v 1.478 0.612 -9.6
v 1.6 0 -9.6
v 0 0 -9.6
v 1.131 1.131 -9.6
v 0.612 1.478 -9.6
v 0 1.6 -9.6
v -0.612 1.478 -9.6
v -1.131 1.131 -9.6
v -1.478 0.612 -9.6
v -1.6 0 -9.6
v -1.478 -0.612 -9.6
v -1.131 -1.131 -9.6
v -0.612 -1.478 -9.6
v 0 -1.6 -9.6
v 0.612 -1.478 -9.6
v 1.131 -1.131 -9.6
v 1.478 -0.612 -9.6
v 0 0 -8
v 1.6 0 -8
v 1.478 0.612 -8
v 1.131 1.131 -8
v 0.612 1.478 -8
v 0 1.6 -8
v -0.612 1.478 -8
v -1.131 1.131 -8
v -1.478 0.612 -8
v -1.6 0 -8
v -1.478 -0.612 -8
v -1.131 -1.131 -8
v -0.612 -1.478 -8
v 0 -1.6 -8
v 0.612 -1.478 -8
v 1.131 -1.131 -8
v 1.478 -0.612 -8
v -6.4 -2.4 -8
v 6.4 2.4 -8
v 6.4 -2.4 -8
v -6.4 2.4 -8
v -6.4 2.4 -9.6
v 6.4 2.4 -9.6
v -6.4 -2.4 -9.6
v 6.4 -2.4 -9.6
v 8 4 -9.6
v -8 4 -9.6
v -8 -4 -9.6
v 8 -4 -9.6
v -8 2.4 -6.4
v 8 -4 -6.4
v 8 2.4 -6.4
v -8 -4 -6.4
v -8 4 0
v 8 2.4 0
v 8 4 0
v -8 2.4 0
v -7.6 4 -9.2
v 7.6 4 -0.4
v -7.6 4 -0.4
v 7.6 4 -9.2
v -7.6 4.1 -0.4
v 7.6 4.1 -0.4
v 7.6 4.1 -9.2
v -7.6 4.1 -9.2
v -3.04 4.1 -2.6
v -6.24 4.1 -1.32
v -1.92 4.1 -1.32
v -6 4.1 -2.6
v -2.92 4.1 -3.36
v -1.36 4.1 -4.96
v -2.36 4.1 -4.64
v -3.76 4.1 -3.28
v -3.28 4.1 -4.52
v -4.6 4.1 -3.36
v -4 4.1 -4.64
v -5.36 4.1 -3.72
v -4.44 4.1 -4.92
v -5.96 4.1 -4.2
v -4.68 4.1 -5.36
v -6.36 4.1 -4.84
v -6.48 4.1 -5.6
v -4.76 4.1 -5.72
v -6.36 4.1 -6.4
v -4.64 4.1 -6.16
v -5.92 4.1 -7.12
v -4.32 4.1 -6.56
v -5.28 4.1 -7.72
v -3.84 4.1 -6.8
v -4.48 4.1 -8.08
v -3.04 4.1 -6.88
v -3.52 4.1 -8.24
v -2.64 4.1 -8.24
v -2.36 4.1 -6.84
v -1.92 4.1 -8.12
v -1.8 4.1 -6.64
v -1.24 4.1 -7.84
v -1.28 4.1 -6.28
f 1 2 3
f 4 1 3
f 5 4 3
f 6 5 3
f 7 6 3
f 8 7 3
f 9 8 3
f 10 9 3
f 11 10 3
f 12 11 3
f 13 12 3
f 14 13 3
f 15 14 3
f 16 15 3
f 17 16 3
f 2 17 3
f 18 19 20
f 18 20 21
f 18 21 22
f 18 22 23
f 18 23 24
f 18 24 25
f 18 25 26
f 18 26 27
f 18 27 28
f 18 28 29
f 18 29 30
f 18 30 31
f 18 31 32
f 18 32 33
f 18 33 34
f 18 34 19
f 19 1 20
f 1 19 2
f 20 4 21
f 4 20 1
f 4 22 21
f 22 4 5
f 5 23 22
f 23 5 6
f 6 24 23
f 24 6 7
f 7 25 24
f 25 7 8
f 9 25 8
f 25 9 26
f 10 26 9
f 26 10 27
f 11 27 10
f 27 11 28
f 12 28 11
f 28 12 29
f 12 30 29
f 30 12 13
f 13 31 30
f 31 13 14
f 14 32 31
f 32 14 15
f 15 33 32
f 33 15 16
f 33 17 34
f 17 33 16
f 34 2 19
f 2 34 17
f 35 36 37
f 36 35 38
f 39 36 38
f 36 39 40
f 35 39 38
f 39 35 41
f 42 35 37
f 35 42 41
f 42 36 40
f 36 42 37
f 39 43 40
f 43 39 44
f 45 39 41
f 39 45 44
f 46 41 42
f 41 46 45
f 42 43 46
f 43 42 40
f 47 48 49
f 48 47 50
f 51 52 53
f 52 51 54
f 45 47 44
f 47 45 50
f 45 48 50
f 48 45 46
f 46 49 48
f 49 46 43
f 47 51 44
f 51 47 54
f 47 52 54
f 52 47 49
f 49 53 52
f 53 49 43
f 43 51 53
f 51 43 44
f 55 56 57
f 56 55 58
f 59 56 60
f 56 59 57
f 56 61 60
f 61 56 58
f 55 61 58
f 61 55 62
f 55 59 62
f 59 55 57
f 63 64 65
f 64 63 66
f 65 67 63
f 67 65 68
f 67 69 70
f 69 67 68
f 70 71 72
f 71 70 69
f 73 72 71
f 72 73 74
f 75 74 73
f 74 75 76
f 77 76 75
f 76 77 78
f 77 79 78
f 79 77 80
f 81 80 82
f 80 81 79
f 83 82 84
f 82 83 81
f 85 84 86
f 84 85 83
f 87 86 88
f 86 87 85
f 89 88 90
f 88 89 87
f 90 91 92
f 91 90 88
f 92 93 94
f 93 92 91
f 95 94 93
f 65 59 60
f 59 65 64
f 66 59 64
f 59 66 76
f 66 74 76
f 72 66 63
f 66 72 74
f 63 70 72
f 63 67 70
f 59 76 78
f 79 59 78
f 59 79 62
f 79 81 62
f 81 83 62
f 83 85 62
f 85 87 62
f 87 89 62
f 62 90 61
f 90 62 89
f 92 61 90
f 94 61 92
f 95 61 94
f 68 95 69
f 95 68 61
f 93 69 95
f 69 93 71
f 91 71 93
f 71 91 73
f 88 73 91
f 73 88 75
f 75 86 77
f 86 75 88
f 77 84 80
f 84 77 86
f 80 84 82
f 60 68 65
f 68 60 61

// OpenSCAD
// file: ../p/4-4edge.scad
use <../lib.scad>
function ldraw_lib__4_4edge() = [
// 0 Circle 1.0
// 0 Name: 4-4edge.dat
// 0 Author: James Jessiman
// 0 !LDRAW_ORG Primitive UPDATE 2017-01
// 0 !LICENSE Licensed under CC BY 2.0 and CC BY 4.0 : see CAreadme.txt
// 
// 0 BFC CERTIFY CCW
  [0,"BFC","CERTIFY"],
  [0,"BFC","CCW"],
// 
// 0 !HISTORY 1998-12-15 [PTadmin] Official Update 1998-10
// 0 !HISTORY 2005-12-28 [PTadmin] Official Update 2005-01
// 0 !HISTORY 2007-06-24 [PTadmin] Header formatted for Contributor Agreement
// 0 !HISTORY 2008-07-01 [PTadmin] Official Update 2008-01
// 0 !HISTORY 2017-01-15 [Steffen] BFCed
// 0 !HISTORY 2017-12-30 [PTadmin] Official Update 2017-01
// 
// 
// 2 24 1 0 0 0.9239 0 0.3827
  [2,24,1,0,0,0.9239,0,0.3827],
// 2 24 0.9239 0 0.3827 0.7071 0 0.7071
  [2,24,0.9239,0,0.3827,0.7071,0,0.7071],
// 2 24 0.7071 0 0.7071 0.3827 0 0.9239
  [2,24,0.7071,0,0.7071,0.3827,0,0.9239],
// 2 24 0.3827 0 0.9239 0 0 1
  [2,24,0.3827,0,0.9239,0,0,1],
// 2 24 0 0 1 -0.3827 0 0.9239
  [2,24,0,0,1,-0.3827,0,0.9239],
// 2 24 -0.3827 0 0.9239 -0.7071 0 0.7071
  [2,24,-0.3827,0,0.9239,-0.7071,0,0.7071],
// 2 24 -0.7071 0 0.7071 -0.9239 0 0.3827
  [2,24,-0.7071,0,0.7071,-0.9239,0,0.3827],
// 2 24 -0.9239 0 0.3827 -1 0 -0
  [2,24,-0.9239,0,0.3827,-1,0,-0],
// 2 24 -1 0 -0 -0.9239 0 -0.3827
  [2,24,-1,0,-0,-0.9239,0,-0.3827],
// 2 24 -0.9239 0 -0.3827 -0.7071 0 -0.7071
  [2,24,-0.9239,0,-0.3827,-0.7071,0,-0.7071],
// 2 24 -0.7071 0 -0.7071 -0.3827 0 -0.9239
  [2,24,-0.7071,0,-0.7071,-0.3827,0,-0.9239],
// 2 24 -0.3827 0 -0.9239 0 0 -1
  [2,24,-0.3827,0,-0.9239,0,0,-1],
// 2 24 0 0 -1 0.3827 0 -0.9239
  [2,24,0,0,-1,0.3827,0,-0.9239],
// 2 24 0.3827 0 -0.9239 0.7071 0 -0.7071
  [2,24,0.3827,0,-0.9239,0.7071,0,-0.7071],
// 2 24 0.7071 0 -0.7071 0.9239 0 -0.3827
  [2,24,0.7071,0,-0.7071,0.9239,0,-0.3827],
// 2 24 0.9239 0 -0.3827 1 0 0
  [2,24,0.9239,0,-0.3827,1,0,0],
];
module ldraw_lib__4_4edge(step=0, col=false, unit=2/5, alt=false, line=0.2, solid=!$preview)
    makepoly(ldraw_lib__4_4edge(), step=step, col=col, unit=unit, alt=alt, line=line, solid=solid);
ldraw_lib__4_4edge(line=0.2);
// file: ../p/4-4disc.scad
use <../lib.scad>
function ldraw_lib__4_4disc() = [
// 0 Disc 1.0
// 0 Name: 4-4disc.dat
// 0 Author: James Jessiman
// 0 !LDRAW_ORG Primitive UPDATE 2002-02
// 0 !LICENSE Licensed under CC BY 2.0 and CC BY 4.0 : see CAreadme.txt
// 
// 0 BFC CERTIFY CCW
  [0,"BFC","CERTIFY"],
  [0,"BFC","CCW"],
// 
// 0 !HISTORY 1998-12-15 [PTadmin] Official Update 1998-10
// 0 !HISTORY 2002-03-23 [sbliss] Added BFC statement
// 0 !HISTORY 2002-04-25 [PTadmin] Official Update 2002-02
// 0 !HISTORY 2007-06-24 [PTadmin] Header formatted for Contributor Agreement
// 0 !HISTORY 2008-07-01 [PTadmin] Official Update 2008-01
// 
// 
// 3 16 0 0 0 1 0 0 0.9239 0 0.3827
  [3,16,0,0,0,1,0,0,0.9239,0,0.3827],
// 3 16 0 0 0 0.9239 0 0.3827 0.7071 0 0.7071
  [3,16,0,0,0,0.9239,0,0.3827,0.7071,0,0.7071],
// 3 16 0 0 0 0.7071 0 0.7071 0.3827 0 0.9239
  [3,16,0,0,0,0.7071,0,0.7071,0.3827,0,0.9239],
// 3 16 0 0 0 0.3827 0 0.9239 0 0 1
  [3,16,0,0,0,0.3827,0,0.9239,0,0,1],
// 3 16 0 0 0 0 0 1 -0.3827 0 0.9239
  [3,16,0,0,0,0,0,1,-0.3827,0,0.9239],
// 3 16 0 0 0 -0.3827 0 0.9239 -0.7071 0 0.7071
  [3,16,0,0,0,-0.3827,0,0.9239,-0.7071,0,0.7071],
// 3 16 0 0 0 -0.7071 0 0.7071 -0.9239 0 0.3827
  [3,16,0,0,0,-0.7071,0,0.7071,-0.9239,0,0.3827],
// 3 16 0 0 0 -0.9239 0 0.3827 -1 0 -0
  [3,16,0,0,0,-0.9239,0,0.3827,-1,0,-0],
// 3 16 0 0 0 -1 0 -0 -0.9239 0 -0.3827
  [3,16,0,0,0,-1,0,-0,-0.9239,0,-0.3827],
// 3 16 0 0 0 -0.9239 0 -0.3827 -0.7071 0 -0.7071
  [3,16,0,0,0,-0.9239,0,-0.3827,-0.7071,0,-0.7071],
// 3 16 0 0 0 -0.7071 0 -0.7071 -0.3827 0 -0.9239
  [3,16,0,0,0,-0.7071,0,-0.7071,-0.3827,0,-0.9239],
// 3 16 0 0 0 -0.3827 0 -0.9239 0 0 -1
  [3,16,0,0,0,-0.3827,0,-0.9239,0,0,-1],
// 3 16 0 0 0 0 0 -1 0.3827 0 -0.9239
  [3,16,0,0,0,0,0,-1,0.3827,0,-0.9239],
// 3 16 0 0 0 0.3827 0 -0.9239 0.7071 0 -0.7071
  [3,16,0,0,0,0.3827,0,-0.9239,0.7071,0,-0.7071],
// 3 16 0 0 0 0.7071 0 -0.7071 0.9239 0 -0.3827
  [3,16,0,0,0,0.7071,0,-0.7071,0.9239,0,-0.3827],
// 3 16 0 0 0 0.9239 0 -0.3827 1 0 0
  [3,16,0,0,0,0.9239,0,-0.3827,1,0,0],
// 0
];
module ldraw_lib__4_4disc(step=0, col=false, unit=2/5, alt=false, line=0.2, solid=!$preview)
    makepoly(ldraw_lib__4_4disc(), step=step, col=col, unit=unit, alt=alt, line=line, solid=solid);
ldraw_lib__4_4disc(line=0.2);
// file: ../p/4-4cyli.scad
use <../lib.scad>
$fa=1; $fs=0.2;
function ldraw_lib__4_4cyli(realsolid=false) = [
// 0 Cylinder 1.0
// 0 Name: 4-4cyli.dat
// 0 Author: James Jessiman
// 0 !LDRAW_ORG Primitive UPDATE 2005-01
// 0 !LICENSE Licensed under CC BY 2.0 and CC BY 4.0 : see CAreadme.txt
// 
// 0 BFC CERTIFY CCW
  [0,"BFC","CERTIFY"],
  [0,"BFC","CCW"],
// 
// 0 !HISTORY 1998-12-15 [PTadmin] Official Update 1998-10
// 0 !HISTORY 2002-03-23 [sbliss] Added BFC statement; merged headers from files in distributions LDraw 0.27 and Complete.
// 0 !HISTORY 2002-04-25 [PTadmin] Official Update 2002-02
// 0 !HISTORY 2004-12-14 [guyvivan] BFC CCW
// 0 !HISTORY 2005-12-28 [PTadmin] Official Update 2005-01
// 0 !HISTORY 2007-06-24 [PTadmin] Header formatted for Contributor Agreement
// 0 !HISTORY 2008-07-01 [PTadmin] Official Update 2008-01
// 
// 
// 4 16 1 1 0 0.9239 1 0.3827 0.9239 0 0.3827 1 0 0
  [4,16,1,1,0,0.9239,1,0.3827,0.9239,0,0.3827,1,0,0],
// 5 24 1 0 0 1 1 0 0.9239 0 0.3827 0.9239 0 -0.3827
  [5,24,1,0,0,1,1,0,0.9239,0,0.3827,0.9239,0,-0.3827],
// 4 16 0.9239 1 0.3827 0.7071 1 0.7071 0.7071 0 0.7071 0.9239 0 0.3827
  [4,16,0.9239,1,0.3827,0.7071,1,0.7071,0.7071,0,0.7071,0.9239,0,0.3827],
// 5 24 0.9239 0 0.3827 0.9239 1 0.3827 0.7071 0 0.7071 1 0 0
  [5,24,0.9239,0,0.3827,0.9239,1,0.3827,0.7071,0,0.7071,1,0,0],
// 4 16 0.7071 1 0.7071 0.3827 1 0.9239 0.3827 0 0.9239 0.7071 0 0.7071
  [4,16,0.7071,1,0.7071,0.3827,1,0.9239,0.3827,0,0.9239,0.7071,0,0.7071],
// 5 24 0.7071 0 0.7071 0.7071 1 0.7071 0.3827 0 0.9239 0.9239 0 0.3827
  [5,24,0.7071,0,0.7071,0.7071,1,0.7071,0.3827,0,0.9239,0.9239,0,0.3827],
// 4 16 0.3827 1 0.9239 0 1 1 0 0 1 0.3827 0 0.9239
  [4,16,0.3827,1,0.9239,0,1,1,0,0,1,0.3827,0,0.9239],
// 5 24 0.3827 0 0.9239 0.3827 1 0.9239 0 0 1 0.7071 0 0.7071
  [5,24,0.3827,0,0.9239,0.3827,1,0.9239,0,0,1,0.7071,0,0.7071],
// 4 16 0 1 1 -0.3827 1 0.9239 -0.3827 0 0.9239 0 0 1
  [4,16,0,1,1,-0.3827,1,0.9239,-0.3827,0,0.9239,0,0,1],
// 5 24 0 0 1 0 1 1 -0.3827 0 0.9239 0.3827 0 0.9239
  [5,24,0,0,1,0,1,1,-0.3827,0,0.9239,0.3827,0,0.9239],
// 4 16 -0.3827 1 0.9239 -0.7071 1 0.7071 -0.7071 0 0.7071 -0.3827 0 0.9239
  [4,16,-0.3827,1,0.9239,-0.7071,1,0.7071,-0.7071,0,0.7071,-0.3827,0,0.9239],
// 5 24 -0.3827 0 0.9239 -0.3827 1 0.9239 -0.7071 0 0.7071 0 0 1
  [5,24,-0.3827,0,0.9239,-0.3827,1,0.9239,-0.7071,0,0.7071,0,0,1],
// 4 16 -0.7071 1 0.7071 -0.9239 1 0.3827 -0.9239 0 0.3827 -0.7071 0 0.7071
  [4,16,-0.7071,1,0.7071,-0.9239,1,0.3827,-0.9239,0,0.3827,-0.7071,0,0.7071],
// 5 24 -0.7071 0 0.7071 -0.7071 1 0.7071 -0.9239 0 0.3827 -0.3827 0 0.9239
  [5,24,-0.7071,0,0.7071,-0.7071,1,0.7071,-0.9239,0,0.3827,-0.3827,0,0.9239],
// 4 16 -0.9239 1 0.3827 -1 1 0 -1 0 0 -0.9239 0 0.3827
  [4,16,-0.9239,1,0.3827,-1,1,0,-1,0,0,-0.9239,0,0.3827],
// 5 24 -0.9239 0 0.3827 -0.9239 1 0.3827 -1 0 0 -0.7071 0 0.7071
  [5,24,-0.9239,0,0.3827,-0.9239,1,0.3827,-1,0,0,-0.7071,0,0.7071],
// 4 16 -1 1 0 -0.9239 1 -0.3827 -0.9239 0 -0.3827 -1 0 0
  [4,16,-1,1,0,-0.9239,1,-0.3827,-0.9239,0,-0.3827,-1,0,0],
// 5 24 -1 0 0 -1 1 0 -0.9239 0 -0.3827 -0.9239 0 0.3827
  [5,24,-1,0,0,-1,1,0,-0.9239,0,-0.3827,-0.9239,0,0.3827],
// 4 16 -0.9239 1 -0.3827 -0.7071 1 -0.7071 -0.7071 0 -0.7071 -0.9239 0 -0.3827
  [4,16,-0.9239,1,-0.3827,-0.7071,1,-0.7071,-0.7071,0,-0.7071,-0.9239,0,-0.3827],
// 5 24 -0.9239 0 -0.3827 -0.9239 1 -0.3827 -0.7071 0 -0.7071 -1 0 0
  [5,24,-0.9239,0,-0.3827,-0.9239,1,-0.3827,-0.7071,0,-0.7071,-1,0,0],
// 4 16 -0.7071 1 -0.7071 -0.3827 1 -0.9239 -0.3827 0 -0.9239 -0.7071 0 -0.7071
  [4,16,-0.7071,1,-0.7071,-0.3827,1,-0.9239,-0.3827,0,-0.9239,-0.7071,0,-0.7071],
// 5 24 -0.7071 0 -0.7071 -0.7071 1 -0.7071 -0.3827 0 -0.9239 -0.9239 0 -0.3827
  [5,24,-0.7071,0,-0.7071,-0.7071,1,-0.7071,-0.3827,0,-0.9239,-0.9239,0,-0.3827],
// 4 16 -0.3827 1 -0.9239 0 1 -1 0 0 -1 -0.3827 0 -0.9239
  [4,16,-0.3827,1,-0.9239,0,1,-1,0,0,-1,-0.3827,0,-0.9239],
// 5 24 -0.3827 0 -0.9239 -0.3827 1 -0.9239 0 0 -1 -0.7071 0 -0.7071
  [5,24,-0.3827,0,-0.9239,-0.3827,1,-0.9239,0,0,-1,-0.7071,0,-0.7071],
// 4 16 0 1 -1 0.3827 1 -0.9239 0.3827 0 -0.9239 0 0 -1
  [4,16,0,1,-1,0.3827,1,-0.9239,0.3827,0,-0.9239,0,0,-1],
// 5 24 0 0 -1 0 1 -1 0.3827 0 -0.9239 -0.3827 0 -0.9239
  [5,24,0,0,-1,0,1,-1,0.3827,0,-0.9239,-0.3827,0,-0.9239],
// 4 16 0.3827 1 -0.9239 0.7071 1 -0.7071 0.7071 0 -0.7071 0.3827 0 -0.9239
  [4,16,0.3827,1,-0.9239,0.7071,1,-0.7071,0.7071,0,-0.7071,0.3827,0,-0.9239],
// 5 24 0.3827 0 -0.9239 0.3827 1 -0.9239 0.7071 0 -0.7071 0 0 -1
  [5,24,0.3827,0,-0.9239,0.3827,1,-0.9239,0.7071,0,-0.7071,0,0,-1],
// 4 16 0.7071 1 -0.7071 0.9239 1 -0.3827 0.9239 0 -0.3827 0.7071 0 -0.7071
  [4,16,0.7071,1,-0.7071,0.9239,1,-0.3827,0.9239,0,-0.3827,0.7071,0,-0.7071],
// 5 24 0.7071 0 -0.7071 0.7071 1 -0.7071 0.9239 0 -0.3827 0.3827 0 -0.9239
  [5,24,0.7071,0,-0.7071,0.7071,1,-0.7071,0.9239,0,-0.3827,0.3827,0,-0.9239],
// 4 16 0.9239 1 -0.3827 1 1 0 1 0 0 0.9239 0 -0.3827
  [4,16,0.9239,1,-0.3827,1,1,0,1,0,0,0.9239,0,-0.3827],
// 5 24 0.9239 0 -0.3827 0.9239 1 -0.3827 1 0 0 0.7071 0 -0.7071
  [5,24,0.9239,0,-0.3827,0.9239,1,-0.3827,1,0,0,0.7071,0,-0.7071],
// 0
];
module ldraw_lib__4_4cyli(step=0, col=false, unit=2/5, alt=false, line=0.2, solid=!$preview)
    makepoly(ldraw_lib__4_4cyli(solid), step=step, col=col, unit=unit, alt=alt, line=line, solid=solid);
ldraw_lib__4_4cyli(line=0.2);
// file: ../p/stud3.scad
use <../lib.scad>
use <4-4cyli.scad>
use <4-4disc.scad>
use <4-4edge.scad>
function ldraw_lib__stud3() = [
// 0 Stud Tube Solid
// 0 Name: stud3.dat
// 0 Author: James Jessiman
// 0 !LDRAW_ORG Primitive UPDATE 2012-01
// 0 !LICENSE Licensed under CC BY 4.0 : see CAreadme.txt
// 
// 0 BFC CERTIFY CCW
  [0,"BFC","CERTIFY"],
  [0,"BFC","CCW"],
// 
// 0 !HISTORY 2002-04-04 [sbliss] Modified for BFC compliance
// 0 !HISTORY 2002-04-25 [PTadmin] Official Update 2002-02
// 0 !HISTORY 2007-06-24 [PTadmin] Header formatted for Contributor Agreement
// 0 !HISTORY 2008-07-01 [PTadmin] Official Update 2008-01
// 0 !HISTORY 2012-02-16 [Philo] Changed to CCW
// 0 !HISTORY 2012-03-30 [PTadmin] Official Update 2012-01
// 
// 
// 1 16 0 -4 0 4 0 0 0 1 0 0 0 4 4-4edge.dat
  [1,16,0,-4,0,4,0,0,0,1,0,0,0,4, ldraw_lib__4_4edge()],
// 1 16 0 0 0 4 0 0 0 1 0 0 0 4 4-4edge.dat
  [1,16,0,0,0,4,0,0,0,1,0,0,0,4, ldraw_lib__4_4edge()],
// 1 16 0 -4 0 4 0 0 0 1 0 0 0 4 4-4disc.dat
  [1,16,0,-4,0,4,0,0,0,1,0,0,0,4, ldraw_lib__4_4disc()],
  [-1,16,0,0,0,4,0,0,0,-1,0,0,0,4, ldraw_lib__4_4disc()],
// 1 16 0 -4 0 4 0 0 0 4 0 0 0 4 4-4cyli.dat
  [1,16,0,-4,0,4,0,0,0,4,0,0,0,4, ldraw_lib__4_4cyli()],
];
module ldraw_lib__stud3(step=0, col=false, unit=2/5, alt=false, line=0.2, solid=!$preview)
    makepoly(ldraw_lib__stud3(), step=step, col=col, unit=unit, alt=alt, line=line, solid=solid);
ldraw_lib__stud3(line=0.2);
// file: ../p/box5.scad
use <../lib.scad>
function ldraw_lib__box5() = [
// 0 Box with 5 Faces and All Edges
// 0 Name: box5.dat
// 0 Author: James Jessiman
// 0 !LDRAW_ORG Primitive UPDATE 2012-01
// 0 !LICENSE Licensed under CC BY 2.0 and CC BY 4.0 : see CAreadme.txt
// 
// 0 BFC CERTIFY CCW
  [0,"BFC","CERTIFY"],
  [0,"BFC","CCW"],
// 
// 0 !HISTORY 2002-04-03 [sbliss] Modified for BFC compliance
// 0 !HISTORY 2002-04-25 [PTadmin] Official Update 2002-02
// 0 !HISTORY 2007-06-24 [PTadmin] Header formatted for Contributor Agreement
// 0 !HISTORY 2008-07-01 [PTadmin] Official Update 2008-01
// 0 !HISTORY 2012-02-16 [Philo] Changed to CCW
// 0 !HISTORY 2012-03-30 [PTadmin] Official Update 2012-01
// 
// 
// 2 24 1 1 1 -1 1 1
  [2,24,1,1,1,-1,1,1],
// 2 24 -1 1 1 -1 1 -1
  [2,24,-1,1,1,-1,1,-1],
// 2 24 -1 1 -1 1 1 -1
  [2,24,-1,1,-1,1,1,-1],
// 2 24 1 1 -1 1 1 1
  [2,24,1,1,-1,1,1,1],
// 2 24 1 0 1 -1 0 1
  [2,24,1,0,1,-1,0,1],
// 2 24 -1 0 1 -1 0 -1
  [2,24,-1,0,1,-1,0,-1],
// 2 24 -1 0 -1 1 0 -1
  [2,24,-1,0,-1,1,0,-1],
// 2 24 1 0 -1 1 0 1
  [2,24,1,0,-1,1,0,1],
// 2 24 1 0 1 1 1 1
  [2,24,1,0,1,1,1,1],
// 2 24 -1 0 1 -1 1 1
  [2,24,-1,0,1,-1,1,1],
// 2 24 1 0 -1 1 1 -1
  [2,24,1,0,-1,1,1,-1],
// 2 24 -1 0 -1 -1 1 -1
  [2,24,-1,0,-1,-1,1,-1],
// 4 16 -1 1 1 1 1 1 1 1 -1 -1 1 -1
  [4,16,-1,1,1,1,1,1,1,1,-1,-1,1,-1],
// 4 16 -1 1 1 -1 0 1 1 0 1 1 1 1
  [4,16,-1,1,1,-1,0,1,1,0,1,1,1,1],
// 4 16 -1 1 -1 -1 0 -1 -1 0 1 -1 1 1
  [4,16,-1,1,-1,-1,0,-1,-1,0,1,-1,1,1],
// 4 16 1 1 -1 1 0 -1 -1 0 -1 -1 1 -1
  [4,16,1,1,-1,1,0,-1,-1,0,-1,-1,1,-1],
// 4 16 1 1 1 1 0 1 1 0 -1 1 1 -1
  [4,16,1,1,1,1,0,1,1,0,-1,1,1,-1],
];
makepoly(ldraw_lib__box5(), line=0.2);
// file: s/4865as01.scad
use <../../lib.scad>
use <../../p/box5.scad>
use <../../p/stud3.scad>
function ldraw_lib__s__4865as01() = [
// 0 ~Panel  1 x  2 x  1 without Front Face
// 0 Name: s\4865as01.dat
// 0 Author: James Jessiman
// 0 !LDRAW_ORG Subpart UPDATE 2020-03
// 0 !LICENSE Licensed under CC BY 2.0 and CC BY 4.0 : see CAreadme.txt
// 
// 0 BFC CERTIFY CCW
  [0,"BFC","CERTIFY"],
  [0,"BFC","CCW"],
// 
// 0 !HISTORY 2003-07-03 [Steffen] BFCed, subfiled
// 0 !HISTORY 2004-04-22 [PTadmin] Official Update 2004-02
// 0 !HISTORY 2007-09-10 [PTadmin] Header formatted for Contributor Agreement
// 0 !HISTORY 2008-07-01 [PTadmin] Official Update 2008-01
// 0 !HISTORY 2020-07-14 [PTadmin] Renamed from s/4865s01
// 0 !HISTORY 2020-12-29 [PTadmin] Official Update 2020-03
// 
// 
// 1 16 0 20 0 1 0 0 0 -1 0 0 0 1 stud3.dat
  [1,16,0,20,0,1,0,0,0,-1,0,0,0,1, ldraw_lib__stud3()],
// 0 BFC INVERTNEXT
  [0,"BFC","INVERTNEXT"],
// 1 16 0 24 0 16 0 0 0 -4 0 0 0 6 box5.dat
  [1,16,0,24,0,16,0,0,0,-4,0,0,0,6, ldraw_lib__box5()],
// 4 16 20 24 10 16 24 6 -16 24 6 -20 24 10
  [4,16,20,24,10,16,24,6,-16,24,6,-20,24,10],
// 4 16 -20 24 10 -16 24 6 -16 24 -6 -20 24 -10
  [4,16,-20,24,10,-16,24,6,-16,24,-6,-20,24,-10],
// 4 16 -20 24 -10 -16 24 -6 16 24 -6 20 24 -10
  [4,16,-20,24,-10,-16,24,-6,16,24,-6,20,24,-10],
// 4 16 20 24 -10 16 24 -6 16 24 6 20 24 10
  [4,16,20,24,-10,16,24,-6,16,24,6,20,24,10],
// 2 24 20 24 10 -20 24 10
  [2,24,20,24,10,-20,24,10],
// 2 24 -20 24 10 -20 24 -10
  [2,24,-20,24,10,-20,24,-10],
// 2 24 -20 24 -10 20 24 -10
  [2,24,-20,24,-10,20,24,-10],
// 2 24 20 24 -10 20 24 10
  [2,24,20,24,-10,20,24,10],
// 2 24 20 16 6 -20 16 6
  [2,24,20,16,6,-20,16,6],
// 2 24 -20 16 6 -20 16 -10
  [2,24,-20,16,6,-20,16,-10],
// 2 24 -20 16 -10 20 16 -10
  [2,24,-20,16,-10,20,16,-10],
// 2 24 20 16 -10 20 16 6
  [2,24,20,16,-10,20,16,6],
// 2 24 20 0 10 -20 0 10
  [2,24,20,0,10,-20,0,10],
// 2 24 -20 0 10 -20 0 6
  [2,24,-20,0,10,-20,0,6],
// 2 24 -20 0 6 20 0 6
  [2,24,-20,0,6,20,0,6],
// 2 24 20 0 6 20 0 10
  [2,24,20,0,6,20,0,10],
// 2 24 20 0 6 20 16 6
  [2,24,20,0,6,20,16,6],
// 2 24 -20 0 6 -20 16 6
  [2,24,-20,0,6,-20,16,6],
// 2 24 20 16 -10 20 24 -10
  [2,24,20,16,-10,20,24,-10],
// 2 24 -20 16 -10 -20 24 -10
  [2,24,-20,16,-10,-20,24,-10],
// 2 24 20 0 10 20 24 10
  [2,24,20,0,10,20,24,10],
// 2 24 -20 0 10 -20 24 10
  [2,24,-20,0,10,-20,24,10],
// 4 16 20 16 -10 20 16 6 -20 16 6 -20 16 -10
  [4,16,20,16,-10,20,16,6,-20,16,6,-20,16,-10],
// 4 16 20 0 6 20 0 10 -20 0 10 -20 0 6
  [4,16,20,0,6,20,0,10,-20,0,10,-20,0,6],
// 4 16 -20 24 10 -20 24 -10 -20 16 -10 -20 16 6
  [4,16,-20,24,10,-20,24,-10,-20,16,-10,-20,16,6],
// 4 16 -20 24 -10 20 24 -10 20 16 -10 -20 16 -10
  [4,16,-20,24,-10,20,24,-10,20,16,-10,-20,16,-10],
// 4 16 20 24 -10 20 24 10 20 16 6 20 16 -10
  [4,16,20,24,-10,20,24,10,20,16,6,20,16,-10],
// 4 16 -20 24 10 -20 16 6 -20 0 6 -20 0 10
  [4,16,-20,24,10,-20,16,6,-20,0,6,-20,0,10],
// 4 16 -20 16 6 20 16 6 20 0 6 -20 0 6
  [4,16,-20,16,6,20,16,6,20,0,6,-20,0,6],
// 4 16 20 16 6 20 24 10 20 0 10 20 0 6
  [4,16,20,16,6,20,24,10,20,0,10,20,0,6],
// 0
];
makepoly(ldraw_lib__s__4865as01(), line=0.2);
// file: ../p/box5-12.scad
use <../lib.scad>
function ldraw_lib__box5_12() = [
// 0 Box with 5 Faces without Any Edges
// 0 Name: box5-12.dat
// 0 Author: Chris Dee [cwdee]
// 0 !LDRAW_ORG Primitive UPDATE 2009-02
// 0 !LICENSE Licensed under CC BY 2.0 and CC BY 4.0 : see CAreadme.txt
// 
// 0 BFC CERTIFY CCW
  [0,"BFC","CERTIFY"],
  [0,"BFC","CCW"],
// 
// 0 !HISTORY 2009-09-03 [PTadmin] Official Update 2009-02
// 
// 
// 4 16 1 1 1 1 1 -1 -1 1 -1 -1 1 1
  [4,16,1,1,1,1,1,-1,-1,1,-1,-1,1,1],
// 4 16 -1 0 1 1 0 1 1 1 1 -1 1 1
  [4,16,-1,0,1,1,0,1,1,1,1,-1,1,1],
// 4 16 -1 0 -1 -1 0 1 -1 1 1 -1 1 -1
  [4,16,-1,0,-1,-1,0,1,-1,1,1,-1,1,-1],
// 4 16 1 0 -1 -1 0 -1 -1 1 -1 1 1 -1
  [4,16,1,0,-1,-1,0,-1,-1,1,-1,1,1,-1],
// 4 16 1 0 1 1 0 -1 1 1 -1 1 1 1
  [4,16,1,0,1,1,0,-1,1,1,-1,1,1,1],
// 0
];
module ldraw_lib__box5_12(step=0, col=false, unit=2/5, alt=false, line=0.2, solid=!$preview)
    makepoly(ldraw_lib__box5_12(), step=step, col=col, unit=unit, alt=alt, line=line, solid=solid);
ldraw_lib__box5_12(line=0.2);
// file: 4865a.scad
use <../lib.scad>
use <s/4865as01.scad>
function ldraw_lib__4865a() = [
// 0 Panel  1 x  2 x  1 with Square Corners
// 0 Name: 4865a.dat
// 0 Author: James Jessiman
// 0 !LDRAW_ORG Part UPDATE 2020-03
// 0 !LICENSE Licensed under CC BY 4.0 : see CAreadme.txt
// 
// 0 BFC CERTIFY CCW
  [0,"BFC","CERTIFY"],
  [0,"BFC","CCW"],
// 
// 0 !KEYWORDS BrickLink 4865
// 
// 0 !PREVIEW 16 0 0 0 -1 0 0 0 1 0 0 0 -1
// 
// 0 !HISTORY 2003-07-03 [Steffen] BFCed, subfiled
// 0 !HISTORY 2004-04-22 [PTadmin] Official Update 2004-02
// 0 !HISTORY 2007-07-09 [PTadmin] Header formatted for Contributor Agreement
// 0 !HISTORY 2008-07-01 [PTadmin] Official Update 2008-01
// 0 !HISTORY 2011-12-08 [PTadmin] Renamed from 4865
// 0 !HISTORY 2011-12-29 [PTadmin] Official Update 2011-02
// 0 !HISTORY 2020-08-01 [cwdee] Use renamed subfile
// 0 !HISTORY 2020-12-29 [PTadmin] Official Update 2020-03
// 
// 
// 1 16 0 0 0 1 0 0 0 1 0 0 0 1 s\4865as01.dat
  [1,16,0,0,0,1,0,0,0,1,0,0,0,1, ldraw_lib__s__4865as01()],
// 4 16 20 24 10 -20 24 10 -20 0 10 20 0 10
  [4,16,20,24,10,-20,24,10,-20,0,10,20,0,10],
// 
];
module ldraw_lib__4865a(step=0, col=false, unit=2/5, alt=false, line=0.2, solid=!$preview)
    makepoly(ldraw_lib__4865a(), step=step, col=col, unit=unit, alt=alt, line=line, solid=solid);
ldraw_lib__4865a(line=0.2);
// file: 168055c.scad
use <../lib.scad>
use <../p/box5-12.scad>
function ldraw_lib__168055c() = [
// 0 Sticker  1.1 x  1.9 with Right White Number Five on Blue Background
// 0 Name: 168055c.dat
// 0 Author: Takeshi Takahashi [RainbowDolphin]
// 0 !LDRAW_ORG Part UPDATE 2024-03
// 0 !LICENSE Licensed under CC BY 4.0 : see CAreadme.txt
// 
// 0 BFC CERTIFY CCW
  [0,"BFC","CERTIFY"],
  [0,"BFC","CCW"],
// 
// 0 !KEYWORDS Formula 1, race car, Renault, Set 1750
// 
// 0 !HISTORY 2024-04-28 [OrionP] Official Update 2024-03
// 
// 
// 1 16 0 -0.25 0 19 0 0 0 0.25 0 0 0 11 box5-12.dat
  [1,16,0,-0.25,0,19,0,0,0,0.25,0,0,0,11, ldraw_lib__box5_12()],
// 4 15 15 -0.25 5.5 15.6 -0.25 8.7 4.8 -0.25 8.7 7.6 -0.25 5.5
  [4,15,15,-0.25,5.5,15.6,-0.25,8.7,4.8,-0.25,8.7,7.6,-0.25,5.5],
// 4 15 7.3 -0.25 3.6 7.6 -0.25 5.5 4.8 -0.25 8.7 3.4 -0.25 -0.4
  [4,15,7.3,-0.25,3.6,7.6,-0.25,5.5,4.8,-0.25,8.7,3.4,-0.25,-0.4],
// 4 15 7.3 -0.25 3.6 3.4 -0.25 -0.4 5.9 -0.25 0.4 9.4 -0.25 3.8
  [4,15,7.3,-0.25,3.6,3.4,-0.25,-0.4,5.9,-0.25,0.4,9.4,-0.25,3.8],
// 4 15 9.4 -0.25 3.8 5.9 -0.25 0.4 8.2 -0.25 0.7 11.5 -0.25 3.6
  [4,15,9.4,-0.25,3.8,5.9,-0.25,0.4,8.2,-0.25,0.7,11.5,-0.25,3.6],
// 4 15 11.5 -0.25 3.6 8.2 -0.25 0.7 10 -0.25 0.4 13.4 -0.25 2.7
  [4,15,11.5,-0.25,3.6,8.2,-0.25,0.7,10,-0.25,0.4,13.4,-0.25,2.7],
// 4 15 13.4 -0.25 2.7 10 -0.25 0.4 11.1 -0.25 -0.3 14.9 -0.25 1.5
  [4,15,13.4,-0.25,2.7,10,-0.25,0.4,11.1,-0.25,-0.3,14.9,-0.25,1.5],
// 4 15 14.9 -0.25 1.5 11.1 -0.25 -0.3 11.7 -0.25 -1.4 15.9 -0.25 -0.1
  [4,15,14.9,-0.25,1.5,11.1,-0.25,-0.3,11.7,-0.25,-1.4,15.9,-0.25,-0.1],
// 4 15 15.9 -0.25 -0.1 11.7 -0.25 -1.4 11.9 -0.25 -2.3 16.2 -0.25 -2
  [4,15,15.9,-0.25,-0.1,11.7,-0.25,-1.4,11.9,-0.25,-2.3,16.2,-0.25,-2],
// 4 15 16.2 -0.25 -2 11.9 -0.25 -2.3 11.6 -0.25 -3.4 15.9 -0.25 -4
  [4,15,16.2,-0.25,-2,11.9,-0.25,-2.3,11.6,-0.25,-3.4,15.9,-0.25,-4],
// 4 15 14.8 -0.25 -5.8 15.9 -0.25 -4 11.6 -0.25 -3.4 10.8 -0.25 -4.4
  [4,15,14.8,-0.25,-5.8,15.9,-0.25,-4,11.6,-0.25,-3.4,10.8,-0.25,-4.4],
// 4 15 13.2 -0.25 -7.3 14.8 -0.25 -5.8 10.8 -0.25 -4.4 9.6 -0.25 -5
  [4,15,13.2,-0.25,-7.3,14.8,-0.25,-5.8,10.8,-0.25,-4.4,9.6,-0.25,-5],
// 4 15 11.2 -0.25 -8.2 13.2 -0.25 -7.3 9.6 -0.25 -5 7.6 -0.25 -5.2
  [4,15,11.2,-0.25,-8.2,13.2,-0.25,-7.3,9.6,-0.25,-5,7.6,-0.25,-5.2],
// 4 15 8.8 -0.25 -8.6 11.2 -0.25 -8.2 7.6 -0.25 -5.2 6.6 -0.25 -8.6
  [4,15,8.8,-0.25,-8.6,11.2,-0.25,-8.2,7.6,-0.25,-5.2,6.6,-0.25,-8.6],
// 4 15 6.6 -0.25 -8.6 7.6 -0.25 -5.2 5.9 -0.25 -5.1 4.8 -0.25 -8.3
  [4,15,6.6,-0.25,-8.6,7.6,-0.25,-5.2,5.9,-0.25,-5.1,4.8,-0.25,-8.3],
// 4 15 4.8 -0.25 -8.3 5.9 -0.25 -5.1 4.5 -0.25 -4.6 3.1 -0.25 -7.6
  [4,15,4.8,-0.25,-8.3,5.9,-0.25,-5.1,4.5,-0.25,-4.6,3.1,-0.25,-7.6],
// 3 15 3.2 -0.25 -3.7 3.1 -0.25 -7.6 4.5 -0.25 -4.6
  [3,15,3.2,-0.25,-3.7,3.1,-0.25,-7.6,4.5,-0.25,-4.6],
// 4 1 15.6 -0.25 8.7 19 -0.25 11 -19 -0.25 11 4.8 -0.25 8.7
  [4,1,15.6,-0.25,8.7,19,-0.25,11,-19,-0.25,11,4.8,-0.25,8.7],
// 4 1 19 -0.25 11 15.6 -0.25 8.7 15 -0.25 5.5 14.9 -0.25 1.5
  [4,1,19,-0.25,11,15.6,-0.25,8.7,15,-0.25,5.5,14.9,-0.25,1.5],
// 3 1 15 -0.25 5.5 13.4 -0.25 2.7 14.9 -0.25 1.5
  [3,1,15,-0.25,5.5,13.4,-0.25,2.7,14.9,-0.25,1.5],
// 4 1 11.5 -0.25 3.6 13.4 -0.25 2.7 15 -0.25 5.5 7.6 -0.25 5.5
  [4,1,11.5,-0.25,3.6,13.4,-0.25,2.7,15,-0.25,5.5,7.6,-0.25,5.5],
// 3 1 7.6 -0.25 5.5 9.4 -0.25 3.8 11.5 -0.25 3.6
  [3,1,7.6,-0.25,5.5,9.4,-0.25,3.8,11.5,-0.25,3.6],
// 3 1 7.6 -0.25 5.5 7.3 -0.25 3.6 9.4 -0.25 3.8
  [3,1,7.6,-0.25,5.5,7.3,-0.25,3.6,9.4,-0.25,3.8],
// 3 1 19 -0.25 11 14.9 -0.25 1.5 15.9 -0.25 -0.1
  [3,1,19,-0.25,11,14.9,-0.25,1.5,15.9,-0.25,-0.1],
// 4 1 19 -0.25 11 15.9 -0.25 -0.1 16.2 -0.25 -2 19 -0.25 -11
  [4,1,19,-0.25,11,15.9,-0.25,-0.1,16.2,-0.25,-2,19,-0.25,-11],
// 3 1 16.2 -0.25 -2 15.9 -0.25 -4 19 -0.25 -11
  [3,1,16.2,-0.25,-2,15.9,-0.25,-4,19,-0.25,-11],
// 3 1 15.9 -0.25 -4 14.8 -0.25 -5.8 19 -0.25 -11
  [3,1,15.9,-0.25,-4,14.8,-0.25,-5.8,19,-0.25,-11],
// 3 1 14.8 -0.25 -5.8 13.2 -0.25 -7.3 19 -0.25 -11
  [3,1,14.8,-0.25,-5.8,13.2,-0.25,-7.3,19,-0.25,-11],
// 3 1 13.2 -0.25 -7.3 11.2 -0.25 -8.2 19 -0.25 -11
  [3,1,13.2,-0.25,-7.3,11.2,-0.25,-8.2,19,-0.25,-11],
// 3 1 11.2 -0.25 -8.2 8.8 -0.25 -8.6 19 -0.25 -11
  [3,1,11.2,-0.25,-8.2,8.8,-0.25,-8.6,19,-0.25,-11],
// 4 1 -19 -0.25 -11 19 -0.25 -11 8.8 -0.25 -8.6 6.6 -0.25 -8.6
  [4,1,-19,-0.25,-11,19,-0.25,-11,8.8,-0.25,-8.6,6.6,-0.25,-8.6],
// 3 1 4.8 -0.25 -8.3 -19 -0.25 -11 6.6 -0.25 -8.6
  [3,1,4.8,-0.25,-8.3,-19,-0.25,-11,6.6,-0.25,-8.6],
// 3 1 3.1 -0.25 -7.6 -19 -0.25 -11 4.8 -0.25 -8.3
  [3,1,3.1,-0.25,-7.6,-19,-0.25,-11,4.8,-0.25,-8.3],
// 3 1 3.2 -0.25 -3.7 -19 -0.25 -11 3.1 -0.25 -7.6
  [3,1,3.2,-0.25,-3.7,-19,-0.25,-11,3.1,-0.25,-7.6],
// 4 1 3.4 -0.25 -0.4 -19 -0.25 -11 3.2 -0.25 -3.7 5.9 -0.25 0.4
  [4,1,3.4,-0.25,-0.4,-19,-0.25,-11,3.2,-0.25,-3.7,5.9,-0.25,0.4],
// 4 1 5.9 -0.25 0.4 3.2 -0.25 -3.7 4.5 -0.25 -4.6 8.2 -0.25 0.7
  [4,1,5.9,-0.25,0.4,3.2,-0.25,-3.7,4.5,-0.25,-4.6,8.2,-0.25,0.7],
// 4 1 8.2 -0.25 0.7 4.5 -0.25 -4.6 5.9 -0.25 -5.1 10 -0.25 0.4
  [4,1,8.2,-0.25,0.7,4.5,-0.25,-4.6,5.9,-0.25,-5.1,10,-0.25,0.4],
// 4 1 10 -0.25 0.4 5.9 -0.25 -5.1 7.6 -0.25 -5.2 11.1 -0.25 -0.3
  [4,1,10,-0.25,0.4,5.9,-0.25,-5.1,7.6,-0.25,-5.2,11.1,-0.25,-0.3],
// 4 1 11.1 -0.25 -0.3 7.6 -0.25 -5.2 9.6 -0.25 -5 11.7 -0.25 -1.4
  [4,1,11.1,-0.25,-0.3,7.6,-0.25,-5.2,9.6,-0.25,-5,11.7,-0.25,-1.4],
// 4 1 11.7 -0.25 -1.4 9.6 -0.25 -5 10.8 -0.25 -4.4 11.9 -0.25 -2.3
  [4,1,11.7,-0.25,-1.4,9.6,-0.25,-5,10.8,-0.25,-4.4,11.9,-0.25,-2.3],
// 3 1 11.9 -0.25 -2.3 10.8 -0.25 -4.4 11.6 -0.25 -3.4
  [3,1,11.9,-0.25,-2.3,10.8,-0.25,-4.4,11.6,-0.25,-3.4],
// 4 1 -19 -0.25 11 -19 -0.25 -11 3.4 -0.25 -0.4 4.8 -0.25 8.7
  [4,1,-19,-0.25,11,-19,-0.25,-11,3.4,-0.25,-0.4,4.8,-0.25,8.7],
];
module ldraw_lib__168055c(step=0, col=false, unit=2/5, alt=false, line=0.2, solid=!$preview)
    makepoly(ldraw_lib__168055c(), step=step, col=col, unit=unit, alt=alt, line=line, solid=solid);
ldraw_lib__168055c(line=0.2);
// main file
use <../lib.scad>
use <168055c.scad>
use <4865a.scad>
function ldraw_lib__4865ad08() = [
// 0 Panel  1 x  2 x  1 with White Number "5" Right Sticker
// 0 Name: 4865ad08.dat
// 0 Author: Takeshi Takahashi [RainbowDolphin]
// 0 !LDRAW_ORG Shortcut UPDATE 2024-08
// 0 !LICENSE Licensed under CC BY 4.0 : see CAreadme.txt
// 
// 0 BFC CERTIFY CCW
  [0,"BFC","CERTIFY"],
  [0,"BFC","CCW"],
// 
// 0 !CATEGORY Sticker Shortcut
// 0 !KEYWORDS Bricklink 4865pb050L, Formula 1, Renault, Set 1750
// 
// 0 !PREVIEW 16 0 0 0 -1 0 0 0 1 0 0 0 -1
// 
// 0 !HISTORY 2024-09-30 [OrionP] Official Update 2024-08
// 
// 1 16 0 0 0 1 0 0 0 1 0 0 0 1 4865a.dat
  [1,16,0,0,0,1,0,0,0,1,0,0,0,1, ldraw_lib__4865a()],
// 1 16 0 12 10 -1 0 0 0 0 -1 0 -1 0 168055c.dat
  [1,16,0,12,10,-1,0,0,0,0,-1,0,-1,0, ldraw_lib__168055c()],
];
module ldraw_lib__4865ad08(step=0, col=false, unit=2/5, alt=false, line=0.2, solid=!$preview)
    makepoly(ldraw_lib__4865ad08(), step=step, col=col, unit=unit, alt=alt, line=line, solid=solid);
ldraw_lib__4865ad08(line=0.2);
